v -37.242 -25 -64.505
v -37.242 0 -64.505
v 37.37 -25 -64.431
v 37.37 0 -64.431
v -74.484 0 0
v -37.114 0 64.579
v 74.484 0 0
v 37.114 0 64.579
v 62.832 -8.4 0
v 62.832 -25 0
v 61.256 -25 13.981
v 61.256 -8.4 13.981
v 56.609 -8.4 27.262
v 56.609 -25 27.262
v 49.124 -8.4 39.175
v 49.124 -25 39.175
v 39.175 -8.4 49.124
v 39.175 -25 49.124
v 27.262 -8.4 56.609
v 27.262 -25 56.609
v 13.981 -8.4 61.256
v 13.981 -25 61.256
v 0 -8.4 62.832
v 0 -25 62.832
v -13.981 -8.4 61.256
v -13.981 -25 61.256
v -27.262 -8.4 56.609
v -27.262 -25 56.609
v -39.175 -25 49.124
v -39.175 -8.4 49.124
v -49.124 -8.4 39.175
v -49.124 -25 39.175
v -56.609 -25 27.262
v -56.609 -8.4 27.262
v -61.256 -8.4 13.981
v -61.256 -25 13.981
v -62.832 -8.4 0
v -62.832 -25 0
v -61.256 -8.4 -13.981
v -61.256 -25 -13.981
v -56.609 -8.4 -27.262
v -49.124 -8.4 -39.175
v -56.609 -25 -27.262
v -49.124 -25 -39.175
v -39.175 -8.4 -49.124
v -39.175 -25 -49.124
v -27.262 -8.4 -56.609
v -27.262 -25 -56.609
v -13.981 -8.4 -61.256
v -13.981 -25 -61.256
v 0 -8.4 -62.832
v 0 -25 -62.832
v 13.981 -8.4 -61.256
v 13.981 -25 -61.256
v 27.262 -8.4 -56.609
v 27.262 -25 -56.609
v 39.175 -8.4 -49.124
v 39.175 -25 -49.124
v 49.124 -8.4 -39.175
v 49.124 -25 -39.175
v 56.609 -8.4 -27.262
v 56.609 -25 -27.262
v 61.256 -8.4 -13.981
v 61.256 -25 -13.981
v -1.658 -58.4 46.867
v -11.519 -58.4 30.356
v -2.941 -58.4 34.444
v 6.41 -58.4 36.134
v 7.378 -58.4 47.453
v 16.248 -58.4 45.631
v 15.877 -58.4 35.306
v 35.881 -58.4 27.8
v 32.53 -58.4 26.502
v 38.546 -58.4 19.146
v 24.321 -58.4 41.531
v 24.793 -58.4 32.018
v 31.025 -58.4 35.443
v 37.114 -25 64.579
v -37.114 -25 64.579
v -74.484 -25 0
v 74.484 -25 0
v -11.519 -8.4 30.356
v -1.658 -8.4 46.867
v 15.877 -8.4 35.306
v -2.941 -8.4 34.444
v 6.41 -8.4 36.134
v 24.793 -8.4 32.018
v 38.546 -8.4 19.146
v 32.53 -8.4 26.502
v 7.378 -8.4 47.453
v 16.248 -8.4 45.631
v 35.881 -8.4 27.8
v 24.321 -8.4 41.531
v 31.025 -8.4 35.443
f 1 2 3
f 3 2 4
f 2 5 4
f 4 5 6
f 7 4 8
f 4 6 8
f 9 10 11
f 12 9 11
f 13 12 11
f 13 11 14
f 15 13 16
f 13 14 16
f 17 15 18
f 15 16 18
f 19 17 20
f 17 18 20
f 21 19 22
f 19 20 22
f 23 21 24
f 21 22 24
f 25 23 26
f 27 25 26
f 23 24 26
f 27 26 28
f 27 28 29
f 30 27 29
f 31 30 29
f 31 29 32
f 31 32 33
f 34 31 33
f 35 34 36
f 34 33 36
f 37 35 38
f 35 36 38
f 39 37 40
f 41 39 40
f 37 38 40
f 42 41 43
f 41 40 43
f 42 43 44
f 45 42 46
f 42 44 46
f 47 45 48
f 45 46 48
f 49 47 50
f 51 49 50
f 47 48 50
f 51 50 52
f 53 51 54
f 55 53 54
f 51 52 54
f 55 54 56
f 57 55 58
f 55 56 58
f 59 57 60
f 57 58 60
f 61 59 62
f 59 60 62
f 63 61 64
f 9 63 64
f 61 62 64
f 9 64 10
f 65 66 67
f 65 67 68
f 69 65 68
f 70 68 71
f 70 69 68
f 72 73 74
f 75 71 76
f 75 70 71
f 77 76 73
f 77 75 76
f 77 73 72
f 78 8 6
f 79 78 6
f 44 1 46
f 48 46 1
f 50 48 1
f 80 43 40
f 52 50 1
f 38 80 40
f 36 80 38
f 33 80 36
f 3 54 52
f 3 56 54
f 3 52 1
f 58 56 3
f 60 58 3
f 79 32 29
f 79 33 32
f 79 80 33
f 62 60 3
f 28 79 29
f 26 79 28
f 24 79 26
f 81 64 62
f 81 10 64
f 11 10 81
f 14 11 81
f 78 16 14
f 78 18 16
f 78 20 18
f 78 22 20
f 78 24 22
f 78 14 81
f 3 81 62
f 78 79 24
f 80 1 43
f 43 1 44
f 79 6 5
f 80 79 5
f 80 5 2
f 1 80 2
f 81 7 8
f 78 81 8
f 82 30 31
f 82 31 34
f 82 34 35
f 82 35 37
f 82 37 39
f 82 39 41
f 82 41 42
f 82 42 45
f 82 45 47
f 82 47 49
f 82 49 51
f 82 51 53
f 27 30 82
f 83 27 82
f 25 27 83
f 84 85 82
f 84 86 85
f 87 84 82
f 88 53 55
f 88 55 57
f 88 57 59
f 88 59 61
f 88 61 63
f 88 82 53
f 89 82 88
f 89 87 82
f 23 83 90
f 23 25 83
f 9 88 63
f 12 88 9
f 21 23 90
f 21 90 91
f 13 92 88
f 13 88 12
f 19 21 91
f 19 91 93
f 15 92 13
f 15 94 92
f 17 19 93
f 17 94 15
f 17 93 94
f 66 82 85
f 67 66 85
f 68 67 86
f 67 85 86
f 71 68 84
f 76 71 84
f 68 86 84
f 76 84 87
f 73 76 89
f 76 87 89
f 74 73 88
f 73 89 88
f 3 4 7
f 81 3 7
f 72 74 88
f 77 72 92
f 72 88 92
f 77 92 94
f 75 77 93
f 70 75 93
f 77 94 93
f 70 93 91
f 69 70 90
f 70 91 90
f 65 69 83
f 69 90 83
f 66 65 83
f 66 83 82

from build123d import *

# Parameters (mm, degrees)
F1_DEPTH = 25
F2_R     = 62.8315
F3_DEPTH = 16.6
F5_DEPTH = 50


with BuildPart() as f1:
    # F0 (on Front) → F1 (new body)
    with BuildSketch(Plane.XZ):
        Polygon((-74.484, 0), (0, 0), (-37.114122, 64.578698), align=None)
        Polygon((-37.114122, 64.578698), (0, 0), (37.114122, 64.578698), align=None)
        Polygon((37.114122, 64.578698), (0, 0), (74.484, 0), align=None)
        Polygon((74.484, 0), (0, 0), (37.369732, -64.431121), align=None)
        Polygon((37.369732, -64.431121), (0, 0), (-37.242, -64.505036), align=None)
        Polygon((-37.242, -64.505036), (0, 0), (-74.484, 0), align=None)
    extrude(amount=F1_DEPTH)

    # F2 (on face) → F3 (cut)
    with BuildSketch(Plane.XZ.offset(25)):
        Circle(F2_R)
    extrude(amount=-F3_DEPTH, mode=Mode.SUBTRACT)

    # F4 (on face) → F5 (join)
    with BuildSketch(Plane.XZ.offset(8.4)):
        with BuildLine():
            ThreePointArc((-11.518612, 30.355605), (15.876825, 35.305832), (38.545772, 19.146203))
            ThreePointArc((38.545772, 19.146203), (24.321415, 41.530617), (-1.657793, 46.866823))
            Line((-1.657793, 46.866823), (-11.518612, 30.355605))
        make_face()
    extrude(amount=F5_DEPTH)


solid = f1.part
